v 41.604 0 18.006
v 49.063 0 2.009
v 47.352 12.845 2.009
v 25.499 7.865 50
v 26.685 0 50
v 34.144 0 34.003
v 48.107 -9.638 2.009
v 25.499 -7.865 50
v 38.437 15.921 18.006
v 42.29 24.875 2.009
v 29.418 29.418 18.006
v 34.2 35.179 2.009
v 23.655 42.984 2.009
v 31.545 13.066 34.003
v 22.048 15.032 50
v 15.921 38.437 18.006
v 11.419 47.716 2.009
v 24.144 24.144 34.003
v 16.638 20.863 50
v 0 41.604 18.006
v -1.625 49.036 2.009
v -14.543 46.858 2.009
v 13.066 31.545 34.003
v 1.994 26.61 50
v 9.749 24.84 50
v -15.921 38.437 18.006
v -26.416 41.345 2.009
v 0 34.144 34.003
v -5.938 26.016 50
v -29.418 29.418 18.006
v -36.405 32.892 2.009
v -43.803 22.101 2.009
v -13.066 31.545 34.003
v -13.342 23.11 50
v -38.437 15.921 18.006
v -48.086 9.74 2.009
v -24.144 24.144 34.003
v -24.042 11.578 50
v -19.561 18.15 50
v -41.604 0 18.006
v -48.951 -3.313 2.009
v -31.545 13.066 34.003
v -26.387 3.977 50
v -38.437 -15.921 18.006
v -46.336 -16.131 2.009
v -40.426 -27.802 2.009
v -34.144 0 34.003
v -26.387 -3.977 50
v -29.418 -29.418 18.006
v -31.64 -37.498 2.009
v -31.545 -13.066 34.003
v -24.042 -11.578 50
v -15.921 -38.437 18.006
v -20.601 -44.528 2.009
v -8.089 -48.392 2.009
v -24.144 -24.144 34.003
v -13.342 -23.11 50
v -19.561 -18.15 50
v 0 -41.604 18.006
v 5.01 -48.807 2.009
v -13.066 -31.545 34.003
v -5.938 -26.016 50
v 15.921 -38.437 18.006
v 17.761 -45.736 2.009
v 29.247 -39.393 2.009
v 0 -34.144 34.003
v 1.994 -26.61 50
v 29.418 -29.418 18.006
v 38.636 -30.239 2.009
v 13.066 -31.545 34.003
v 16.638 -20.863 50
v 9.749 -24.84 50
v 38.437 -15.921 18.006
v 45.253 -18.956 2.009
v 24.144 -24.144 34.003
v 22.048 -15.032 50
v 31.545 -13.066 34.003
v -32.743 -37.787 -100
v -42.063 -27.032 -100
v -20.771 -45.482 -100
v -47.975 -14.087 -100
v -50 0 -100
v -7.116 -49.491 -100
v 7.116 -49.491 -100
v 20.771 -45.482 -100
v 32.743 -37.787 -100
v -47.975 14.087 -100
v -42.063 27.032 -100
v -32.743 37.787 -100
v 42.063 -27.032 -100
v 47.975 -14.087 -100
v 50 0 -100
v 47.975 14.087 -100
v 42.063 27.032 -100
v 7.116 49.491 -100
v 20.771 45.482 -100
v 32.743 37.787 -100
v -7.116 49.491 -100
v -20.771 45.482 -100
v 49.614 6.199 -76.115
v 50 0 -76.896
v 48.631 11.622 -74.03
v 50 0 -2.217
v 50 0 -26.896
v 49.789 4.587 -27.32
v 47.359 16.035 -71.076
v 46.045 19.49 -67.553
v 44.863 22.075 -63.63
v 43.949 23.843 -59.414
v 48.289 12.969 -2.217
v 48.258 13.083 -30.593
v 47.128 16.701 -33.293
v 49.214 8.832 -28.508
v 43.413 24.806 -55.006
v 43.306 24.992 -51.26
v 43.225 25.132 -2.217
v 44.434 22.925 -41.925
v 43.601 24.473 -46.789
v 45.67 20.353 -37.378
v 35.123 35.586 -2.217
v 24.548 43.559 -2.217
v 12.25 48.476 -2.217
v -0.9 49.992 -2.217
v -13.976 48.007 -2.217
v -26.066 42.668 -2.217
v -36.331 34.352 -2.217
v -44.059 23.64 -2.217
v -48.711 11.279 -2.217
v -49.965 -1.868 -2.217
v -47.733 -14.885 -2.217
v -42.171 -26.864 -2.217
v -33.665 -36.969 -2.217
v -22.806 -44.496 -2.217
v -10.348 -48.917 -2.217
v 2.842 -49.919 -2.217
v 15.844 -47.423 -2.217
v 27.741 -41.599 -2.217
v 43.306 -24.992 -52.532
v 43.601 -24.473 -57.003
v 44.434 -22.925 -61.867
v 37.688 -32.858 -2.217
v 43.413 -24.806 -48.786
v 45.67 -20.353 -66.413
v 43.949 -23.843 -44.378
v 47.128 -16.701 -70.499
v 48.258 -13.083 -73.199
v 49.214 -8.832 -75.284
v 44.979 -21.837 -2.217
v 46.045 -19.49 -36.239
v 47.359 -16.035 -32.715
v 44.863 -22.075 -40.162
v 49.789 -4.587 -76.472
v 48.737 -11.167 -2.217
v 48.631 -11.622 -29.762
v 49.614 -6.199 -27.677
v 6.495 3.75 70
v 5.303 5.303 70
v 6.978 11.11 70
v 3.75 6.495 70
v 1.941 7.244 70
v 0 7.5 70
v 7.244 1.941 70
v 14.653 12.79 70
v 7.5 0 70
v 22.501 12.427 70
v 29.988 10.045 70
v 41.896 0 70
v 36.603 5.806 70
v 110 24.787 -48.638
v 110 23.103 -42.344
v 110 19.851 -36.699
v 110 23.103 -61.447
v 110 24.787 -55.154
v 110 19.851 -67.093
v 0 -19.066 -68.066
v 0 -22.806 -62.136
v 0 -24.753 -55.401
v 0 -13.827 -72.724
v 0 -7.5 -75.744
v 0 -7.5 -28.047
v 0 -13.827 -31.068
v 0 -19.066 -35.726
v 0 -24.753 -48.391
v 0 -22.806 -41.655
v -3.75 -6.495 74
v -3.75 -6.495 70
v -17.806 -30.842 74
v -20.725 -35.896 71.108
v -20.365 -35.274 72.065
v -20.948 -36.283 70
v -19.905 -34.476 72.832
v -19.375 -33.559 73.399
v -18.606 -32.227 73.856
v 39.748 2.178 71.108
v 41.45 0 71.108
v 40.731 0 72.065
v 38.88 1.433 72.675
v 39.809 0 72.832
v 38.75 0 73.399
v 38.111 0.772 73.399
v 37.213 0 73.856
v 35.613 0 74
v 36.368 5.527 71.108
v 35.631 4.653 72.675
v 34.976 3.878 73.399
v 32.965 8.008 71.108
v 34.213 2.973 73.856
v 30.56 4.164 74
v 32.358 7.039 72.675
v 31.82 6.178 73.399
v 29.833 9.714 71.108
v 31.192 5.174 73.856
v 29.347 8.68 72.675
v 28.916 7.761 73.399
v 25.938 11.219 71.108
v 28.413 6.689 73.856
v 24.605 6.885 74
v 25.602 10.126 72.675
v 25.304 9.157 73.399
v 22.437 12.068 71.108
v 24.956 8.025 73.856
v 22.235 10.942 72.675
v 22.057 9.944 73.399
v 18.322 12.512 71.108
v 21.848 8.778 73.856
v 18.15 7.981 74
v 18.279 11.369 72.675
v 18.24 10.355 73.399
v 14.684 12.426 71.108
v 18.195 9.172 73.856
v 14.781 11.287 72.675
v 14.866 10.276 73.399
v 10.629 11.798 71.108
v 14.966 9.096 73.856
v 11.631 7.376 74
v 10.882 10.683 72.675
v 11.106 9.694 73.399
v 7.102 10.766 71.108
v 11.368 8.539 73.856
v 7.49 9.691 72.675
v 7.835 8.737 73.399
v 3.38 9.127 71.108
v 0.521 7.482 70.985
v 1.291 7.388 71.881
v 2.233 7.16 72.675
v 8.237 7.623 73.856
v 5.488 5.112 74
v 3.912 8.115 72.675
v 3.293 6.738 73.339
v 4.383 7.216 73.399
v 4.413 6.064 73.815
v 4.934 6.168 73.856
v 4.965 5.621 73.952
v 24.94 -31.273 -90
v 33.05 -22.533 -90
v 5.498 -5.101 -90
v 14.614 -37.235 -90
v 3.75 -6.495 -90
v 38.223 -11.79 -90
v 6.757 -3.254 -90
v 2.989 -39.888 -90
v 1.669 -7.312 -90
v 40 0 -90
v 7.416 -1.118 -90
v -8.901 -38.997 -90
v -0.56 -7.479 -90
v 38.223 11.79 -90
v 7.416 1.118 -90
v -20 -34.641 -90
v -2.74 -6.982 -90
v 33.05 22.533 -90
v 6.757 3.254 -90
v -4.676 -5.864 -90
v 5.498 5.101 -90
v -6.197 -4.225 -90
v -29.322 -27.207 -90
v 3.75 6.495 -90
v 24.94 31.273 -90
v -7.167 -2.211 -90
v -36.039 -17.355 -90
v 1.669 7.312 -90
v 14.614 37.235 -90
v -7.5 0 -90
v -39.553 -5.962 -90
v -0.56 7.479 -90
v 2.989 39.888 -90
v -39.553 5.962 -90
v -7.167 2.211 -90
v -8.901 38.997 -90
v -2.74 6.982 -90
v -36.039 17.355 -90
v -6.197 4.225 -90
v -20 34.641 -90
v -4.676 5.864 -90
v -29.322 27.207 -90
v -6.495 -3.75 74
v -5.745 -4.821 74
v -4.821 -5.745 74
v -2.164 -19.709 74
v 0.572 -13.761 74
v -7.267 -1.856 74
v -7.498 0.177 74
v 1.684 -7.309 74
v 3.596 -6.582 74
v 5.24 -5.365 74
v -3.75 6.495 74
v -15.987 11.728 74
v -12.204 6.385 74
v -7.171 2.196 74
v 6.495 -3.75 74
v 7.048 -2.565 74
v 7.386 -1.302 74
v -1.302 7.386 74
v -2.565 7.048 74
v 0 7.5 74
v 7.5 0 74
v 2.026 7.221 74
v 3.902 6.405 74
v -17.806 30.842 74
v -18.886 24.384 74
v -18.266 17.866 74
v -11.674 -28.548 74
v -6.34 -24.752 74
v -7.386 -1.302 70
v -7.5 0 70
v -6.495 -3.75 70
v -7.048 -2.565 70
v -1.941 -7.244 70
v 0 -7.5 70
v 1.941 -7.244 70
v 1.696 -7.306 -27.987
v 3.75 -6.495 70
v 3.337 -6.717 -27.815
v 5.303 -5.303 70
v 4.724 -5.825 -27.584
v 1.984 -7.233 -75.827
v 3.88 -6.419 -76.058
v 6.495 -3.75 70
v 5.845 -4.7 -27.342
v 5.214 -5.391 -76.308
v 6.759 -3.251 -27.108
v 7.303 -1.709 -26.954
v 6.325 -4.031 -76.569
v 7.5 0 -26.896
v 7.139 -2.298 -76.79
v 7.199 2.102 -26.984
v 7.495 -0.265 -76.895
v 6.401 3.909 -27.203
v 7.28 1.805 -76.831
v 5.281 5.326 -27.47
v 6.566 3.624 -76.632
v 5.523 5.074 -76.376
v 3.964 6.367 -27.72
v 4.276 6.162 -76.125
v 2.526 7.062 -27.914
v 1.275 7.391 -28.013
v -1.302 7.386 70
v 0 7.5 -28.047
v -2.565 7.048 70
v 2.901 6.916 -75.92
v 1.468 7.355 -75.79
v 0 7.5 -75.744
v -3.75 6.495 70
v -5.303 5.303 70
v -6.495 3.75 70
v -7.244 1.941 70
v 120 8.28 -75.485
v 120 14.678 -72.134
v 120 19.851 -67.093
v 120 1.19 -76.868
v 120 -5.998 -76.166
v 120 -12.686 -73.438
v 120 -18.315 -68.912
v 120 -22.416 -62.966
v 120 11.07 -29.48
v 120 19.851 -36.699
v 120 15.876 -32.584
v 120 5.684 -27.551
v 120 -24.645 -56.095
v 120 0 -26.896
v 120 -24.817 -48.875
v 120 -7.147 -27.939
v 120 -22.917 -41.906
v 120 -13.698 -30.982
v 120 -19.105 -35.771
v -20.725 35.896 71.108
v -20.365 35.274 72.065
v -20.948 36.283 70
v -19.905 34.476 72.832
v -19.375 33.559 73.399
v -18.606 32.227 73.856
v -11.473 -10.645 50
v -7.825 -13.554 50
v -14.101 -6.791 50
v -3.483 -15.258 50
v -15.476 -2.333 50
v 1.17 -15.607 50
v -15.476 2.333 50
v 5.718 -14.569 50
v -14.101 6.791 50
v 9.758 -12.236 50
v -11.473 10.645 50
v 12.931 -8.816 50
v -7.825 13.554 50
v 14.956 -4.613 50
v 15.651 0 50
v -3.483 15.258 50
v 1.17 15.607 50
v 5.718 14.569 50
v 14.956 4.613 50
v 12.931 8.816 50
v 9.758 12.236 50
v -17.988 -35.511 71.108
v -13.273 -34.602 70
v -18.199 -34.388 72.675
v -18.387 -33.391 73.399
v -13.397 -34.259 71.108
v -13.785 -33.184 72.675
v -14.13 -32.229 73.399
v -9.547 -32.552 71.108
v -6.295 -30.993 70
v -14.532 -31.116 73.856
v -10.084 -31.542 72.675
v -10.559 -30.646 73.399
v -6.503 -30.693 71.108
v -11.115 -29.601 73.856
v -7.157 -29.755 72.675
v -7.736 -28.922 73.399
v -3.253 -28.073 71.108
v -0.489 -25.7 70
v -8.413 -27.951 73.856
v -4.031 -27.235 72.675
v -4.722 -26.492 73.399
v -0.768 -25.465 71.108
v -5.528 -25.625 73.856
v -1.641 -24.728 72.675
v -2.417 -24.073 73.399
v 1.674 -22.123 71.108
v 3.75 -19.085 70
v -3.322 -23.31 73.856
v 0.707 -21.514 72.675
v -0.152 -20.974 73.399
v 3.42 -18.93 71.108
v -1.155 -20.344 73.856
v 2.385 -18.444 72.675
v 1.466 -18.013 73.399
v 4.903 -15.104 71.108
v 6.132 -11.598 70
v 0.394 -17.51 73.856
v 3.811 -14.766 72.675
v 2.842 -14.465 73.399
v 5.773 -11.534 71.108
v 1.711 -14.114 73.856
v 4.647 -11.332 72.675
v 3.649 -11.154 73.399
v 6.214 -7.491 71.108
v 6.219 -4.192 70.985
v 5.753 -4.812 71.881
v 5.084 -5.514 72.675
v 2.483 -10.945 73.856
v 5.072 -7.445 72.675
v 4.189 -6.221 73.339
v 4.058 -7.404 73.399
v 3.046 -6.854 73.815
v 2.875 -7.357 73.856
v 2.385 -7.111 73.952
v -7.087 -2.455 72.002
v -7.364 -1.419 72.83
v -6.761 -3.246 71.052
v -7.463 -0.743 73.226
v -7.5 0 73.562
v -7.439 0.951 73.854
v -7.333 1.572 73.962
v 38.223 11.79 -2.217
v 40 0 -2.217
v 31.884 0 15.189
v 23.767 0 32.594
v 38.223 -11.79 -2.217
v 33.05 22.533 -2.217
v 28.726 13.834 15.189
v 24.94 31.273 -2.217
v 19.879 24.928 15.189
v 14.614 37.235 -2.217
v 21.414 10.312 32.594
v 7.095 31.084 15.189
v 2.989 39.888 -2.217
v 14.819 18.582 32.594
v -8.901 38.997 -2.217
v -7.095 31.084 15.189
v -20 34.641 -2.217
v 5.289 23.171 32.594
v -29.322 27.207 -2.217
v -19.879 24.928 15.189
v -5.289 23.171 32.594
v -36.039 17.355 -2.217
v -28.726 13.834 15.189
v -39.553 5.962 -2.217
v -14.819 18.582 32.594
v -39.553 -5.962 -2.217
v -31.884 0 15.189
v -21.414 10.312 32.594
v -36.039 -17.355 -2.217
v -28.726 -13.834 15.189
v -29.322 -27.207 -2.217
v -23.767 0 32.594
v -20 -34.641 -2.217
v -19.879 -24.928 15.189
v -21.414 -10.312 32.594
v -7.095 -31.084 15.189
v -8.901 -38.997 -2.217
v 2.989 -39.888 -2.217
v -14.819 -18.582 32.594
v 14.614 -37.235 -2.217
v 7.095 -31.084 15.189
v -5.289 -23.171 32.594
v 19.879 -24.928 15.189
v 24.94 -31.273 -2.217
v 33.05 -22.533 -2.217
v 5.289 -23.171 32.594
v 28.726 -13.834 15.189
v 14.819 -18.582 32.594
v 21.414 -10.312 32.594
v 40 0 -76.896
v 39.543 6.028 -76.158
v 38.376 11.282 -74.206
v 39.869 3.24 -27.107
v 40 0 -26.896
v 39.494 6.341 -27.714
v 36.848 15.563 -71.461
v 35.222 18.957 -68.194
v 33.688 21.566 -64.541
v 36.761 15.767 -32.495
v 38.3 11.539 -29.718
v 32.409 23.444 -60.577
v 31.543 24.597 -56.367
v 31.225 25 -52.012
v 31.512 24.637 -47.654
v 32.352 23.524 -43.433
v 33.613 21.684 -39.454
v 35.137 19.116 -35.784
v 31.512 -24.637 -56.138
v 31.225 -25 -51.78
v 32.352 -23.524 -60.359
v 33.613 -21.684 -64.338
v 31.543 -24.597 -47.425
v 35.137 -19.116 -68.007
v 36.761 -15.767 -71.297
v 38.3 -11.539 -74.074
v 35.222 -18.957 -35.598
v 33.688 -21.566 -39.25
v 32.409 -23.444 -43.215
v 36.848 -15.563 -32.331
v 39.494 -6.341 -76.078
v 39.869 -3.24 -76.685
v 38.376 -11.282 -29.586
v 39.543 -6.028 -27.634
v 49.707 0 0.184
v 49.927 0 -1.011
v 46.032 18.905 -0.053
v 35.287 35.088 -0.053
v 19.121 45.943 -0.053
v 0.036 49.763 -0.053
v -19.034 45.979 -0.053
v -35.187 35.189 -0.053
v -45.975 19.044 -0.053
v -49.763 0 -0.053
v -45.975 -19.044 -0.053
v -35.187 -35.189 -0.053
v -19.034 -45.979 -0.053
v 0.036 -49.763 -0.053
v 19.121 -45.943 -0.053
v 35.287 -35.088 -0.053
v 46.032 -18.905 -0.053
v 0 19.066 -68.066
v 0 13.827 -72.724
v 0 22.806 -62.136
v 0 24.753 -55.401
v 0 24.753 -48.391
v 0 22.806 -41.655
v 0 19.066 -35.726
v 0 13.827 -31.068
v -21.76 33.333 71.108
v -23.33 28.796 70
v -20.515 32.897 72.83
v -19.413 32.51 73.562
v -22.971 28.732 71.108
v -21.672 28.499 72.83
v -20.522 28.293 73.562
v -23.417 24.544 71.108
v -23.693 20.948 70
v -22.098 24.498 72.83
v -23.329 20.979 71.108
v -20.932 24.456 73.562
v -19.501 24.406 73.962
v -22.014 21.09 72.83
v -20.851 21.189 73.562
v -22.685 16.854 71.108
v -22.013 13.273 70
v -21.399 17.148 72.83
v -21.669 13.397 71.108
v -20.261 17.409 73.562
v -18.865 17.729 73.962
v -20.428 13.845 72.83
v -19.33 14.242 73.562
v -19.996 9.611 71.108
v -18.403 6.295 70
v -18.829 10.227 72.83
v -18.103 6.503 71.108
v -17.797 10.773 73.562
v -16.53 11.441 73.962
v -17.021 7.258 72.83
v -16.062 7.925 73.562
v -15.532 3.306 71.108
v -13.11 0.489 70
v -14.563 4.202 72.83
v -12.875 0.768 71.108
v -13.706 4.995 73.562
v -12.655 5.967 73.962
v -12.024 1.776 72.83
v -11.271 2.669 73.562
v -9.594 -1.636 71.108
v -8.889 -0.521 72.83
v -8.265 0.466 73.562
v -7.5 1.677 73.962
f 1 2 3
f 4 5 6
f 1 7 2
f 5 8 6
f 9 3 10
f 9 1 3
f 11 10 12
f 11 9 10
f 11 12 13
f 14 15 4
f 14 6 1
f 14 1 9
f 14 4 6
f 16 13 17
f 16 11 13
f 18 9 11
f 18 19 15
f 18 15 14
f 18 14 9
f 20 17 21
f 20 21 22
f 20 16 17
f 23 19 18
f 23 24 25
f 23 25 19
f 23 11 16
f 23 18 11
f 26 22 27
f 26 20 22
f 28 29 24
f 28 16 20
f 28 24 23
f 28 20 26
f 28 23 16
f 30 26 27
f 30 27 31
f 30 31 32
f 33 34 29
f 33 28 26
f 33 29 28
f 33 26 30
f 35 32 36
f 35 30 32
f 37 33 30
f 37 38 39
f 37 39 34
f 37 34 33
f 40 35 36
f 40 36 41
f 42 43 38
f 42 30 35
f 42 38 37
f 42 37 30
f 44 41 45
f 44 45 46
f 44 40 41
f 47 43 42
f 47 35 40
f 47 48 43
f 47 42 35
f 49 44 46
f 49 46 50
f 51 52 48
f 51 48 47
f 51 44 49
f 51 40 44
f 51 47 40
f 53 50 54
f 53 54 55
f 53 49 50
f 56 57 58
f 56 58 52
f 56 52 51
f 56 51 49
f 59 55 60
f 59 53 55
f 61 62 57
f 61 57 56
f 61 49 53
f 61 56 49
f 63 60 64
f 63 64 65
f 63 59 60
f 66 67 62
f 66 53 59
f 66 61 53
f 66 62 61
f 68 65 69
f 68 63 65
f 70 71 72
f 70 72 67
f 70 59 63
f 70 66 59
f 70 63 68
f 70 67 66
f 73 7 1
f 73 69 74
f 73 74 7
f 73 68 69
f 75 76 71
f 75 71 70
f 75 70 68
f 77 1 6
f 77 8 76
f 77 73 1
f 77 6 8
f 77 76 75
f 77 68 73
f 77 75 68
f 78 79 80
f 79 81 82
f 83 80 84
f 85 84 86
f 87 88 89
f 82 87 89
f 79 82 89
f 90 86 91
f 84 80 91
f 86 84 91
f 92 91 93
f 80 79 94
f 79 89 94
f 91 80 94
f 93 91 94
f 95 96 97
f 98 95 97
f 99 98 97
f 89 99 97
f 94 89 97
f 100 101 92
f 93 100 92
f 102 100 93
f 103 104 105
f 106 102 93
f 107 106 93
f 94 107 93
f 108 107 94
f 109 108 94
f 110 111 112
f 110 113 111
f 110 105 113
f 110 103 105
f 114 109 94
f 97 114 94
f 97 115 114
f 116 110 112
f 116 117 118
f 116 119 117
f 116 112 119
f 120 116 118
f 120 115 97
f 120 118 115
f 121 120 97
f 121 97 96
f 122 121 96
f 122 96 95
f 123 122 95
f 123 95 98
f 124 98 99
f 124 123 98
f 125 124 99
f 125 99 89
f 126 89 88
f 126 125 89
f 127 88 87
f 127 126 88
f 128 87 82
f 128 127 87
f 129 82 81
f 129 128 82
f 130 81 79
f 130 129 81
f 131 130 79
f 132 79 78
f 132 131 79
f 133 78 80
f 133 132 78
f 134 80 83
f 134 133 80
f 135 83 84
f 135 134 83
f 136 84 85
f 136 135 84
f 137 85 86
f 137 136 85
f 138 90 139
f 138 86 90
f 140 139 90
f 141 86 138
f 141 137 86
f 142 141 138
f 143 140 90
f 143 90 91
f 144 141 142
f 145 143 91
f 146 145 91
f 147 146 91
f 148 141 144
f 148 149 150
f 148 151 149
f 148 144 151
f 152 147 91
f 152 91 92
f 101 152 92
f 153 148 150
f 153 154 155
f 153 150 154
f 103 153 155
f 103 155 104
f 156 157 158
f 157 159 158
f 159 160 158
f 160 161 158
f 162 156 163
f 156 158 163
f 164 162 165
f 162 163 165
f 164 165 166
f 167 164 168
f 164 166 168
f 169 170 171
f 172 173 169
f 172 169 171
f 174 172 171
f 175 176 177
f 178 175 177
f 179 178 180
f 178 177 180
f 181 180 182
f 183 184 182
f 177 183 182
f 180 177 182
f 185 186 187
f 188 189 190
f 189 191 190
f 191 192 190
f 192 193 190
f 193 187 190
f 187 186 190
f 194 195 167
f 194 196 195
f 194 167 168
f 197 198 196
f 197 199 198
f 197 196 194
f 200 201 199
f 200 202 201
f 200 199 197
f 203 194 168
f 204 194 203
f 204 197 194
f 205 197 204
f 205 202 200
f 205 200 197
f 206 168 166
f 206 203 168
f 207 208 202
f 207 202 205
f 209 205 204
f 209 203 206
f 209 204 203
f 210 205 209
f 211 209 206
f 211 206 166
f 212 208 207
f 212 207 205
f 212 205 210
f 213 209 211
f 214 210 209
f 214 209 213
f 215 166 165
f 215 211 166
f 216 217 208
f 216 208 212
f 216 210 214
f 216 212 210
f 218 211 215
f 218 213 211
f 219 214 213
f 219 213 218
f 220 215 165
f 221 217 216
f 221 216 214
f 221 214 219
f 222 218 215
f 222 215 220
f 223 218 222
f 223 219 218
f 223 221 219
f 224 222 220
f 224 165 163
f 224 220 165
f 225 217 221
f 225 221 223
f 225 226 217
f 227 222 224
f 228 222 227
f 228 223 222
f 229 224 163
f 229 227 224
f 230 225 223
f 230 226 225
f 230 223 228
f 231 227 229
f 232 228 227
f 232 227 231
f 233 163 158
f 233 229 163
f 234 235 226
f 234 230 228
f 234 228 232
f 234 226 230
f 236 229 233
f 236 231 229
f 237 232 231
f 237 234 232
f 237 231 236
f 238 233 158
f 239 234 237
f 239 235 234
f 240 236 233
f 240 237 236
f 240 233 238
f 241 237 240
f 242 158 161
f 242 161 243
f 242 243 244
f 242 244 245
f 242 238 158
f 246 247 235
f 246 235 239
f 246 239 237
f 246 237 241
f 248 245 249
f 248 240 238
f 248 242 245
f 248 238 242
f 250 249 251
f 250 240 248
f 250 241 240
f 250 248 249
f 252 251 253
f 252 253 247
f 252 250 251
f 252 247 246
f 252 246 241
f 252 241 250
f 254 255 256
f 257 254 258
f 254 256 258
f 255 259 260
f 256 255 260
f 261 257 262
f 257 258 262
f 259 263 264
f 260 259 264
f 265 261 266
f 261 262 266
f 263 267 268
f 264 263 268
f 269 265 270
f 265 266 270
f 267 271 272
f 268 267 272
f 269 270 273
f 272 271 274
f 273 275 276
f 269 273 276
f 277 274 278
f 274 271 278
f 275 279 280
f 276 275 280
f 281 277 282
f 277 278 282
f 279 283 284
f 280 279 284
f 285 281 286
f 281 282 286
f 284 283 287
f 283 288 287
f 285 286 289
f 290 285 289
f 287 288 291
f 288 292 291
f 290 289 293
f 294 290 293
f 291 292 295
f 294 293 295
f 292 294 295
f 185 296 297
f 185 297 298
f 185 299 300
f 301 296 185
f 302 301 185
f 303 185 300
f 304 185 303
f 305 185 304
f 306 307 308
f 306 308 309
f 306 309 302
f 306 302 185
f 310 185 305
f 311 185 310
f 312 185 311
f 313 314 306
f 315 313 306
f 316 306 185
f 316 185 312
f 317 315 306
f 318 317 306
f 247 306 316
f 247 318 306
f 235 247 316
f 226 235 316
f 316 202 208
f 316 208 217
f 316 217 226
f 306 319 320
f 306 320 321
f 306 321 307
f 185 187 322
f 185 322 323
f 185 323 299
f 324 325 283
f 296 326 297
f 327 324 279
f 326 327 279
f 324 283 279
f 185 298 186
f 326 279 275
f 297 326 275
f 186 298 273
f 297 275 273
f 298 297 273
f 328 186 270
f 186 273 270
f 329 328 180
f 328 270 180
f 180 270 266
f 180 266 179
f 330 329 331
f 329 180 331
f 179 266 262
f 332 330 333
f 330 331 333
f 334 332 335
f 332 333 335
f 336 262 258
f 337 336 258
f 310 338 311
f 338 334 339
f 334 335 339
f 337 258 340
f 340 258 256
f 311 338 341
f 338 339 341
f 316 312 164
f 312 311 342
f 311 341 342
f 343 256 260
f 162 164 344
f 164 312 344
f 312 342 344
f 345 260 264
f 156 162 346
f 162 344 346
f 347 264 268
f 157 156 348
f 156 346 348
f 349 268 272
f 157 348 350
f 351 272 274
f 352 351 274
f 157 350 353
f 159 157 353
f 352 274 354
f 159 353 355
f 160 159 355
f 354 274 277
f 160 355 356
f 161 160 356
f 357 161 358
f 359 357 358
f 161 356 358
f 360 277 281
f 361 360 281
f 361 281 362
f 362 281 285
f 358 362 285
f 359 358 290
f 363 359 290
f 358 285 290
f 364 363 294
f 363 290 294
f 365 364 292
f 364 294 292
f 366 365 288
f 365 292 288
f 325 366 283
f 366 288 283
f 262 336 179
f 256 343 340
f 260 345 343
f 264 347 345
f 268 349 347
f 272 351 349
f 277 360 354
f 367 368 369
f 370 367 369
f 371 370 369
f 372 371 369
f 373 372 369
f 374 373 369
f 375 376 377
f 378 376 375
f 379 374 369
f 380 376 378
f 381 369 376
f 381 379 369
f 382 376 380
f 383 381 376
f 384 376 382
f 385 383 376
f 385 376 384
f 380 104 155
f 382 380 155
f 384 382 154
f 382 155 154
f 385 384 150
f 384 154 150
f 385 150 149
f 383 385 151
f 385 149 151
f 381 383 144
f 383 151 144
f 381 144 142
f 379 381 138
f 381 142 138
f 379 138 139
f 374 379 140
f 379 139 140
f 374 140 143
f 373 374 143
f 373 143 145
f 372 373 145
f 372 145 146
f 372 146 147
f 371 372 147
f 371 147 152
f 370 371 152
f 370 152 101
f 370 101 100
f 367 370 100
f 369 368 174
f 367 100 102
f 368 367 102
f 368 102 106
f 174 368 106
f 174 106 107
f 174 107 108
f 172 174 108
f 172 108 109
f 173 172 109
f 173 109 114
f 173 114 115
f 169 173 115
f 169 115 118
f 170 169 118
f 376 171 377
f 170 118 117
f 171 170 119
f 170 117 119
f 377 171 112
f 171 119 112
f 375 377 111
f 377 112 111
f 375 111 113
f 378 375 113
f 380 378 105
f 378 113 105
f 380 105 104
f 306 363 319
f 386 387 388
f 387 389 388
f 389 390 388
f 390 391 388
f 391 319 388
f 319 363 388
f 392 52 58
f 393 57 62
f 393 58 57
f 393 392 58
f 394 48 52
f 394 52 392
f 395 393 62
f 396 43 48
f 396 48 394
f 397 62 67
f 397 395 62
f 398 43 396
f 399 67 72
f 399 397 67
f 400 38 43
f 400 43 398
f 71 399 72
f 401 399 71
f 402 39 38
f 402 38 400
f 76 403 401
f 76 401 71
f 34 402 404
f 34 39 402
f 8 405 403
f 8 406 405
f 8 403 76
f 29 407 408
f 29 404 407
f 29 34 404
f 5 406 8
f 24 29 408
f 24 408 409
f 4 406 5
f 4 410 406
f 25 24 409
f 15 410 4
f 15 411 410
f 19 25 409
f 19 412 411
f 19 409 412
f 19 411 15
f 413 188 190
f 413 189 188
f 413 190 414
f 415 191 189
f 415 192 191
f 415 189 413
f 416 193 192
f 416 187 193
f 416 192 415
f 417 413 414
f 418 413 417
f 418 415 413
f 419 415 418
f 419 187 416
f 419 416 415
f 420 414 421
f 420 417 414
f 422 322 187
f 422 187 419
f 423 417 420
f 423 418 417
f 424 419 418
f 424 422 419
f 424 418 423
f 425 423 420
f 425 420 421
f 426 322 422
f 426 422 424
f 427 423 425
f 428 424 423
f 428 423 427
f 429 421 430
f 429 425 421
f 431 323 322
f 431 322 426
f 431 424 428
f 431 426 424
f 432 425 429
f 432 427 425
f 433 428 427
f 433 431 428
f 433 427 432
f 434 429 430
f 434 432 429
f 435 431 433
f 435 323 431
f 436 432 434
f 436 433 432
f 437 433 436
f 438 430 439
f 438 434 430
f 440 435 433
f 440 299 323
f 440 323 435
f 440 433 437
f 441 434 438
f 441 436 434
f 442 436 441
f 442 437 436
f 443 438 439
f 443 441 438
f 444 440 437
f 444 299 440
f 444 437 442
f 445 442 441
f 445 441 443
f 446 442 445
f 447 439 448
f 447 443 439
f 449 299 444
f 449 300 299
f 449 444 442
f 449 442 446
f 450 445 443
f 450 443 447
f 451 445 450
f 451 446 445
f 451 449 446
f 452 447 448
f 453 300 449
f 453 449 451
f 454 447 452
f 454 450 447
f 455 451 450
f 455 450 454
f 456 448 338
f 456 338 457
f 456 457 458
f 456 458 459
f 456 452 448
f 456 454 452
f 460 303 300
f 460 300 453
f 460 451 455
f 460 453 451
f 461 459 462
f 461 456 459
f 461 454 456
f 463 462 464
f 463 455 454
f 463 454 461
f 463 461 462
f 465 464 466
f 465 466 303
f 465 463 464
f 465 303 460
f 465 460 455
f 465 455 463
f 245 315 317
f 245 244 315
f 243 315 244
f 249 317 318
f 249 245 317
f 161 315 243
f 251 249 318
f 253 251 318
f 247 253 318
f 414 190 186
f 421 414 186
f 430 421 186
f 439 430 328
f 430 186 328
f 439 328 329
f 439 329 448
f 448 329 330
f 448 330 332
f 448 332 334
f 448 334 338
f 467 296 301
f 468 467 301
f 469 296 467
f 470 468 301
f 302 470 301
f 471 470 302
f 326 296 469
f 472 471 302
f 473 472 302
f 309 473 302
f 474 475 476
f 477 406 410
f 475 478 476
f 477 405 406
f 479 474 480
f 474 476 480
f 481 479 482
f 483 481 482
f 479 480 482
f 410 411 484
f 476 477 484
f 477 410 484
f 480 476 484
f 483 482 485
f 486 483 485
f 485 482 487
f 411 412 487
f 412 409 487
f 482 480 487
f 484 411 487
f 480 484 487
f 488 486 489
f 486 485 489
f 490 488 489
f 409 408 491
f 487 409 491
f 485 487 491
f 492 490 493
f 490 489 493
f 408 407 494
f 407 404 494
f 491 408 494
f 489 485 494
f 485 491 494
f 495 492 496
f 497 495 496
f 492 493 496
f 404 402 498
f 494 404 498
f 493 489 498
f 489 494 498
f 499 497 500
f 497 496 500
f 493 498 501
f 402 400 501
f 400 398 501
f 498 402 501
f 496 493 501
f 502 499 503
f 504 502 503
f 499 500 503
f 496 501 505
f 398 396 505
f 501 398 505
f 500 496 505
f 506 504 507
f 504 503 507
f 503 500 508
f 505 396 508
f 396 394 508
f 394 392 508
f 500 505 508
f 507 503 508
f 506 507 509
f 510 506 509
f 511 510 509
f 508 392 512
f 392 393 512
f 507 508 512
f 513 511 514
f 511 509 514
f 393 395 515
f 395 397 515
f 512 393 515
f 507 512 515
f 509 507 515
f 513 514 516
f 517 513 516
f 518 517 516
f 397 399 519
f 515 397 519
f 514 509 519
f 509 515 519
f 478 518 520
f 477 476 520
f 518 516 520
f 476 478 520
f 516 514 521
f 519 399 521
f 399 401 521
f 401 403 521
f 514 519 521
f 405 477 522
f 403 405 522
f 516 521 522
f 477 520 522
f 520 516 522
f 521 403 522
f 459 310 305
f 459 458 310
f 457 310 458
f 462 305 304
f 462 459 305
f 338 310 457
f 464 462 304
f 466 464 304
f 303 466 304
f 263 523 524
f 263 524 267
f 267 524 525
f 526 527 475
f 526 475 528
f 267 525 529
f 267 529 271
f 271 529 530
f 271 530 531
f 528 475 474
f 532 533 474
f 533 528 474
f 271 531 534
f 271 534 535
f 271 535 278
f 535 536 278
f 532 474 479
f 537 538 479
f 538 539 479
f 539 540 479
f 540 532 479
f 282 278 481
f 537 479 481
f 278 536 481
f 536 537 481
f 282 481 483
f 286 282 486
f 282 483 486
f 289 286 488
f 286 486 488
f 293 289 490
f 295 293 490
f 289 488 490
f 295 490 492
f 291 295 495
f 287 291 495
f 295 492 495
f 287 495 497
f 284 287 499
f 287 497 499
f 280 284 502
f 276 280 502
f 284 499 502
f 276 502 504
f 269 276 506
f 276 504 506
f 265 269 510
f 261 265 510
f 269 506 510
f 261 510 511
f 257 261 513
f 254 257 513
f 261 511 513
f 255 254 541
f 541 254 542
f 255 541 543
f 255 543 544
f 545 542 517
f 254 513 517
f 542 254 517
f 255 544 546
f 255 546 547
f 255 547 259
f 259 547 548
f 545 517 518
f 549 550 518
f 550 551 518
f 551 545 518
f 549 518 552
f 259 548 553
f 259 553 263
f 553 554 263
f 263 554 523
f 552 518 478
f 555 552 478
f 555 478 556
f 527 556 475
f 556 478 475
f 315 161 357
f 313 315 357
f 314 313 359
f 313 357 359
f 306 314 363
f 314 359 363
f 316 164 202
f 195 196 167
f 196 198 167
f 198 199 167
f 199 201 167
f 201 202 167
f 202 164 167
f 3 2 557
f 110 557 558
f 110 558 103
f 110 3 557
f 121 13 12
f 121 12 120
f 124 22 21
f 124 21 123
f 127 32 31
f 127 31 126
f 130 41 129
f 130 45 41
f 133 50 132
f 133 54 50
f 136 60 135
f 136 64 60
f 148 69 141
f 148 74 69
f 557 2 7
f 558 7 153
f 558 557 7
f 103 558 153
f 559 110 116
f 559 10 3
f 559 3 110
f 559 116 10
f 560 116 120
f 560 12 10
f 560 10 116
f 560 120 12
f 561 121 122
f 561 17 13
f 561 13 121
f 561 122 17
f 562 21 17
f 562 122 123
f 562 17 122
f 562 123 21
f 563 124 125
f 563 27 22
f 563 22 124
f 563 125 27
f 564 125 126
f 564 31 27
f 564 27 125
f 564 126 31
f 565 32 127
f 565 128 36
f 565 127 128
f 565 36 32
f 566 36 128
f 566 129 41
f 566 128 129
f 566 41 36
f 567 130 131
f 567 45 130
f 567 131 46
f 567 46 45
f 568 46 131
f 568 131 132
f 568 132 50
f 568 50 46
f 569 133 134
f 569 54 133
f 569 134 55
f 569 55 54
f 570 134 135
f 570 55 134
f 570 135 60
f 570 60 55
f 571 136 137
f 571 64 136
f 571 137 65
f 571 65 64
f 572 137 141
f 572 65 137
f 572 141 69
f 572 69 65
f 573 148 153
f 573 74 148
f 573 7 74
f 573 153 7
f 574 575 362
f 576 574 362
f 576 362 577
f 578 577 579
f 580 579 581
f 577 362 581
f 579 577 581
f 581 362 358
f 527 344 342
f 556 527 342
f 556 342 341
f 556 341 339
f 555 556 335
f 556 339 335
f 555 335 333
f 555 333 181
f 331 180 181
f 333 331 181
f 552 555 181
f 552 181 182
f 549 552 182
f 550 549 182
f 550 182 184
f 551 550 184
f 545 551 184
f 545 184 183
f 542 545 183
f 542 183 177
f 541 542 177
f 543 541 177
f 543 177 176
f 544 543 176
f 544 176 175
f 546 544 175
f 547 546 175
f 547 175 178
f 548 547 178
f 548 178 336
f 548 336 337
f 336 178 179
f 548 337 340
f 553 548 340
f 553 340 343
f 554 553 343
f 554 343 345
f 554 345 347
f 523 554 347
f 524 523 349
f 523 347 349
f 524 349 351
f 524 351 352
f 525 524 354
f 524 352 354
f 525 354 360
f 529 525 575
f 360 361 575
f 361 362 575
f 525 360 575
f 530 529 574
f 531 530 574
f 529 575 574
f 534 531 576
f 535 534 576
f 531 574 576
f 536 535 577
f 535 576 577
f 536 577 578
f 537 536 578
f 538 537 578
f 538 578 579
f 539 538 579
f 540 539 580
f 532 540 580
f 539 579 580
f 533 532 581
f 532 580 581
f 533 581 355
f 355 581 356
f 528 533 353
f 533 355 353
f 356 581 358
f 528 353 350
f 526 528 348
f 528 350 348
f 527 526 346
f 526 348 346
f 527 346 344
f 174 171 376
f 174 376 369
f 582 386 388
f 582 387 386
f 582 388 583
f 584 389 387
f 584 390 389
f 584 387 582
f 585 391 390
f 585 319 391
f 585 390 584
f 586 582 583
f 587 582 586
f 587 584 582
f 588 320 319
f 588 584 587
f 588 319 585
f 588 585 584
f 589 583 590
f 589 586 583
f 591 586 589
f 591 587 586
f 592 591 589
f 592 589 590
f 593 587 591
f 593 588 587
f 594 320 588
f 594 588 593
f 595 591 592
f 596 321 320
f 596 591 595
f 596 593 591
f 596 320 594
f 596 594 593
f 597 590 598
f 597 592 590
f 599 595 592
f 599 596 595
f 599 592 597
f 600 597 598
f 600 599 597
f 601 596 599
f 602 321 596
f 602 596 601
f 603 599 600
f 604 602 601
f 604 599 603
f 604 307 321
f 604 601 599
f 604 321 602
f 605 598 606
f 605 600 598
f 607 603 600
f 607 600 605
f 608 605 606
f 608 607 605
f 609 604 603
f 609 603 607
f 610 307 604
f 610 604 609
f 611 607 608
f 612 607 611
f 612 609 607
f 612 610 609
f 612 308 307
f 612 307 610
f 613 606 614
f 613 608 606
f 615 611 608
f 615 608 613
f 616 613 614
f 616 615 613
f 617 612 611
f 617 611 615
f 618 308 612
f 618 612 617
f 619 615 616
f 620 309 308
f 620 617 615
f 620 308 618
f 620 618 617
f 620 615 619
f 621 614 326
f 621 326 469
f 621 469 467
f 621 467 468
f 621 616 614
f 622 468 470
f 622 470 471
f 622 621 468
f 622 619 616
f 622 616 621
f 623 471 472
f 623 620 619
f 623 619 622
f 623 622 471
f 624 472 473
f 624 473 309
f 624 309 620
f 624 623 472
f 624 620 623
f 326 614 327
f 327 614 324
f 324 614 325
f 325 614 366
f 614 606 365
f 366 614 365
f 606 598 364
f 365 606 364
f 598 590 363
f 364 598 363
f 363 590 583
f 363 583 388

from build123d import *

# Parameters (mm, degrees)
SKETCH1_R                     = 50
BOSS_EXTRUDE1_DEPTH           = 100
BOSS_EXTRUDE1_OTHER_WAY_DEPTH = 50
BOSS_EXTRUDE1_OTHER_WAY_TAPER = 25
FILLET1_R                     = 10
SKETCH2_R                     = 7.5
BOSS_EXTRUDE2_DEPTH           = 160
SKETCH3_R                     = 7.5
BOSS_EXTRUDE3_DEPTH           = 4
FILLET2_R                     = 5
SKETCH4_R                     = 25
BOSS_EXTRUDE4_DEPTH           = 120
CUT_EXTRUDE2_START            = -10
CUT_EXTRUDE2_DEPTH            = 10


with BuildPart() as part:
    # Sketch1 → Boss-Extrude1 (new body)
    with BuildSketch(Plane.XY):
        Circle(SKETCH1_R)
    extrude(amount=-BOSS_EXTRUDE1_DEPTH)

    # Sketch1 → Boss-Extrude1 other way (add)
    with BuildSketch(Plane.XY):
        Circle(SKETCH1_R)
    extrude(amount=BOSS_EXTRUDE1_OTHER_WAY_DEPTH, taper=BOSS_EXTRUDE1_OTHER_WAY_TAPER)

    # Fillet1
    fillet1_edges = [part.edges().sort_by_distance(p)[0] for p in [
        (-50, 0, 0),
    ]]
    fillet(fillet1_edges, radius=FILLET1_R)

    # Shell2: read off the stored shape, not the designer's step
    # Shell2 outline → Shell2 (revolve, cut)
    with BuildSketch(Plane.XZ):
        Polygon((0, -90), (40, -90), (40, -2.216946626), (15.650837903, 50), (0, 50), align=None)
    revolve(axis=Axis((0, 0, 0), (0, 0, 1)), mode=Mode.SUBTRACT)

    # Sketch2 → Boss-Extrude2 (add)
    with BuildSketch(Plane.XY.offset(-90)):
        with Locations(Location((0, 0, 0), (0, 0, 180))):
            Circle(SKETCH2_R)
    extrude(amount=BOSS_EXTRUDE2_DEPTH)

    # Sketch3 → Boss-Extrude3 (add)
    with BuildSketch(Plane.XY.offset(70)):
        with BuildLine():
            ThreePointArc((0, 7.5), (5.303300859, 5.303300859), (7.5, 0))
            Line((7.5, 0), (41.895706174, 0))
            ThreePointArc((41.895706174, 0), (22.501153946, 12.426884851), (0, 7.5))
        make_face()
        with BuildLine():
            ThreePointArc((-6.495190528, -3.75), (-7.244443697, 1.941142838), (-3.75, 6.495190528))
            Line((-3.75, 6.495190528), (-20.947853087, 36.282745856))
            ThreePointArc((-20.947853087, 36.282745856), (-22.012574944, 13.273128506), (-6.495190528, -3.75))
        make_face()
        with BuildLine():
            ThreePointArc((-20.947853087, -36.282745856), (-0.488579002, -25.700013357), (6.495190528, -3.75))
            ThreePointArc((6.495190528, -3.75), (1.941142838, -7.244443697), (-3.75, -6.495190528))
            Line((-3.75, -6.495190528), (-20.947853087, -36.282745856))
        make_face()
        Circle(SKETCH3_R)
    extrude(amount=BOSS_EXTRUDE3_DEPTH)

    # Fillet2
    # the kernel refuses this fillet: 5 mm, written as the material it takes off along each edge
    with BuildSketch(Plane(origin=(17.197853087, -17.197853087, 74), x_dir=(0.979838516120554, 0.1997910967152214, 0), z_dir=(0.1997910967152214, -0.979838516120554, 0))) as fillet2_piece_1_section:
        with BuildLine():
            CenterArc((25.196702894, -5), FILLET2_R, 11.536959033, 78.463040967)
            Line((30.09568238, -4), (30.09568238, 0))
            Line((30.09568238, 0), (25.196702894, 0))
        make_face()
    fillet2_piece_1 = revolve(axis=Axis((17.197853087, -17.197853087, 74), (0, 0, 1)), revolution_arc=136.651808839, mode=Mode.PRIVATE)
    fillet2_piece_1 = fillet2_piece_1 - Plane(origin=(0, 0, 74), x_dir=(-1, 0, 0), z_dir=(0, 0, -1)) * Cylinder(7.5, 121, mode=Mode.PRIVATE)
    fillet2_piece_1 = split(fillet2_piece_1, bisect_by=Plane(origin=(17.197853087, 0, 74), z_dir=(0, 1, 0)), keep=Keep.TOP, mode=Mode.PRIVATE)
    add(fillet2_piece_1, mode=Mode.SUBTRACT)
    with BuildSketch(Plane(origin=(-23.492704207, -6.29485112, 74), x_dir=(-0.31689509285493905, -0.9484605949244596, 0), z_dir=(-0.9484605949244596, 0.31689509285493905, 0))) as fillet2_piece_2_section:
        with BuildLine():
            CenterArc((25.196702894, -5), FILLET2_R, 11.536959033, 78.463040967)
            Line((30.09568238, -4), (30.09568238, 0))
            Line((30.09568238, 0), (25.196702894, 0))
        make_face()
    fillet2_piece_2 = revolve(axis=Axis((-23.492704207, -6.29485112, 74), (0, 0, 1)), revolution_arc=136.651808839, mode=Mode.PRIVATE)
    fillet2_piece_2 = fillet2_piece_2 - Plane(origin=(0, 0, 74), x_dir=(-1, 0, 0), z_dir=(0, 0, -1)) * Cylinder(7.5, 121, mode=Mode.PRIVATE)
    fillet2_piece_2 = split(fillet2_piece_2, bisect_by=Plane(origin=(-8.598926543, -14.893777664, 74), z_dir=(0.8660254037844364, -0.500000000000004, 0)), keep=Keep.TOP, mode=Mode.PRIVATE)
    add(fillet2_piece_2, mode=Mode.SUBTRACT)
    with BuildSketch(Plane(origin=(6.29485112, 23.492704207, 74), x_dir=(-0.6629434232656098, 0.7486694982092396, 0), z_dir=(0.7486694982092396, 0.6629434232656098, 0))) as fillet2_piece_3_section:
        with BuildLine():
            CenterArc((25.196702894, -5), FILLET2_R, 11.536959033, 78.463040967)
            Line((25.196702894, 0), (30.09568238, 0))
            Line((30.09568238, 0), (30.09568238, -4))
        make_face()
    fillet2_piece_3 = revolve(axis=Axis((6.29485112, 23.492704207, 74), (0, 0, 1)), revolution_arc=136.651808839, mode=Mode.PRIVATE)
    fillet2_piece_3 = fillet2_piece_3 - Plane(origin=(0, 0, 74), x_dir=(-1, 0, 0), z_dir=(0, 0, -1)) * Cylinder(7.5, 121, mode=Mode.PRIVATE)
    fillet2_piece_3 = split(fillet2_piece_3, bisect_by=Plane(origin=(-8.598926543, 14.893777664, 74), z_dir=(-0.8660254037844434, -0.49999999999999206, 0)), keep=Keep.TOP, mode=Mode.PRIVATE)
    add(fillet2_piece_3, mode=Mode.SUBTRACT)

    # Sketch4 → Boss-Extrude4 (add)
    with BuildSketch(Plane(origin=(0, 0, 0), x_dir=(0, 0, -1), z_dir=(1, 0, 0))):
        with Locations(Location((51.895913136, 0, 0), (0, 0, 180))):
            Circle(SKETCH4_R)
    extrude(amount=BOSS_EXTRUDE4_DEPTH)

    # Sketch5 → Cut-Extrude2 (cut)
    with BuildSketch(Plane(origin=(120, 0, 0), x_dir=(0, 0, -1), z_dir=(1, 0, 0)).offset(CUT_EXTRUDE2_START)):
        with BuildLine():
            Line((36.699086206, 19.850855177), (67.092740066, 19.850855177))
            ThreePointArc((67.092740066, 19.850855177), (51.895913136, 25), (36.699086206, 19.850855177))
        make_face()
    extrude(amount=CUT_EXTRUDE2_DEPTH, mode=Mode.SUBTRACT)


solid = part.part
